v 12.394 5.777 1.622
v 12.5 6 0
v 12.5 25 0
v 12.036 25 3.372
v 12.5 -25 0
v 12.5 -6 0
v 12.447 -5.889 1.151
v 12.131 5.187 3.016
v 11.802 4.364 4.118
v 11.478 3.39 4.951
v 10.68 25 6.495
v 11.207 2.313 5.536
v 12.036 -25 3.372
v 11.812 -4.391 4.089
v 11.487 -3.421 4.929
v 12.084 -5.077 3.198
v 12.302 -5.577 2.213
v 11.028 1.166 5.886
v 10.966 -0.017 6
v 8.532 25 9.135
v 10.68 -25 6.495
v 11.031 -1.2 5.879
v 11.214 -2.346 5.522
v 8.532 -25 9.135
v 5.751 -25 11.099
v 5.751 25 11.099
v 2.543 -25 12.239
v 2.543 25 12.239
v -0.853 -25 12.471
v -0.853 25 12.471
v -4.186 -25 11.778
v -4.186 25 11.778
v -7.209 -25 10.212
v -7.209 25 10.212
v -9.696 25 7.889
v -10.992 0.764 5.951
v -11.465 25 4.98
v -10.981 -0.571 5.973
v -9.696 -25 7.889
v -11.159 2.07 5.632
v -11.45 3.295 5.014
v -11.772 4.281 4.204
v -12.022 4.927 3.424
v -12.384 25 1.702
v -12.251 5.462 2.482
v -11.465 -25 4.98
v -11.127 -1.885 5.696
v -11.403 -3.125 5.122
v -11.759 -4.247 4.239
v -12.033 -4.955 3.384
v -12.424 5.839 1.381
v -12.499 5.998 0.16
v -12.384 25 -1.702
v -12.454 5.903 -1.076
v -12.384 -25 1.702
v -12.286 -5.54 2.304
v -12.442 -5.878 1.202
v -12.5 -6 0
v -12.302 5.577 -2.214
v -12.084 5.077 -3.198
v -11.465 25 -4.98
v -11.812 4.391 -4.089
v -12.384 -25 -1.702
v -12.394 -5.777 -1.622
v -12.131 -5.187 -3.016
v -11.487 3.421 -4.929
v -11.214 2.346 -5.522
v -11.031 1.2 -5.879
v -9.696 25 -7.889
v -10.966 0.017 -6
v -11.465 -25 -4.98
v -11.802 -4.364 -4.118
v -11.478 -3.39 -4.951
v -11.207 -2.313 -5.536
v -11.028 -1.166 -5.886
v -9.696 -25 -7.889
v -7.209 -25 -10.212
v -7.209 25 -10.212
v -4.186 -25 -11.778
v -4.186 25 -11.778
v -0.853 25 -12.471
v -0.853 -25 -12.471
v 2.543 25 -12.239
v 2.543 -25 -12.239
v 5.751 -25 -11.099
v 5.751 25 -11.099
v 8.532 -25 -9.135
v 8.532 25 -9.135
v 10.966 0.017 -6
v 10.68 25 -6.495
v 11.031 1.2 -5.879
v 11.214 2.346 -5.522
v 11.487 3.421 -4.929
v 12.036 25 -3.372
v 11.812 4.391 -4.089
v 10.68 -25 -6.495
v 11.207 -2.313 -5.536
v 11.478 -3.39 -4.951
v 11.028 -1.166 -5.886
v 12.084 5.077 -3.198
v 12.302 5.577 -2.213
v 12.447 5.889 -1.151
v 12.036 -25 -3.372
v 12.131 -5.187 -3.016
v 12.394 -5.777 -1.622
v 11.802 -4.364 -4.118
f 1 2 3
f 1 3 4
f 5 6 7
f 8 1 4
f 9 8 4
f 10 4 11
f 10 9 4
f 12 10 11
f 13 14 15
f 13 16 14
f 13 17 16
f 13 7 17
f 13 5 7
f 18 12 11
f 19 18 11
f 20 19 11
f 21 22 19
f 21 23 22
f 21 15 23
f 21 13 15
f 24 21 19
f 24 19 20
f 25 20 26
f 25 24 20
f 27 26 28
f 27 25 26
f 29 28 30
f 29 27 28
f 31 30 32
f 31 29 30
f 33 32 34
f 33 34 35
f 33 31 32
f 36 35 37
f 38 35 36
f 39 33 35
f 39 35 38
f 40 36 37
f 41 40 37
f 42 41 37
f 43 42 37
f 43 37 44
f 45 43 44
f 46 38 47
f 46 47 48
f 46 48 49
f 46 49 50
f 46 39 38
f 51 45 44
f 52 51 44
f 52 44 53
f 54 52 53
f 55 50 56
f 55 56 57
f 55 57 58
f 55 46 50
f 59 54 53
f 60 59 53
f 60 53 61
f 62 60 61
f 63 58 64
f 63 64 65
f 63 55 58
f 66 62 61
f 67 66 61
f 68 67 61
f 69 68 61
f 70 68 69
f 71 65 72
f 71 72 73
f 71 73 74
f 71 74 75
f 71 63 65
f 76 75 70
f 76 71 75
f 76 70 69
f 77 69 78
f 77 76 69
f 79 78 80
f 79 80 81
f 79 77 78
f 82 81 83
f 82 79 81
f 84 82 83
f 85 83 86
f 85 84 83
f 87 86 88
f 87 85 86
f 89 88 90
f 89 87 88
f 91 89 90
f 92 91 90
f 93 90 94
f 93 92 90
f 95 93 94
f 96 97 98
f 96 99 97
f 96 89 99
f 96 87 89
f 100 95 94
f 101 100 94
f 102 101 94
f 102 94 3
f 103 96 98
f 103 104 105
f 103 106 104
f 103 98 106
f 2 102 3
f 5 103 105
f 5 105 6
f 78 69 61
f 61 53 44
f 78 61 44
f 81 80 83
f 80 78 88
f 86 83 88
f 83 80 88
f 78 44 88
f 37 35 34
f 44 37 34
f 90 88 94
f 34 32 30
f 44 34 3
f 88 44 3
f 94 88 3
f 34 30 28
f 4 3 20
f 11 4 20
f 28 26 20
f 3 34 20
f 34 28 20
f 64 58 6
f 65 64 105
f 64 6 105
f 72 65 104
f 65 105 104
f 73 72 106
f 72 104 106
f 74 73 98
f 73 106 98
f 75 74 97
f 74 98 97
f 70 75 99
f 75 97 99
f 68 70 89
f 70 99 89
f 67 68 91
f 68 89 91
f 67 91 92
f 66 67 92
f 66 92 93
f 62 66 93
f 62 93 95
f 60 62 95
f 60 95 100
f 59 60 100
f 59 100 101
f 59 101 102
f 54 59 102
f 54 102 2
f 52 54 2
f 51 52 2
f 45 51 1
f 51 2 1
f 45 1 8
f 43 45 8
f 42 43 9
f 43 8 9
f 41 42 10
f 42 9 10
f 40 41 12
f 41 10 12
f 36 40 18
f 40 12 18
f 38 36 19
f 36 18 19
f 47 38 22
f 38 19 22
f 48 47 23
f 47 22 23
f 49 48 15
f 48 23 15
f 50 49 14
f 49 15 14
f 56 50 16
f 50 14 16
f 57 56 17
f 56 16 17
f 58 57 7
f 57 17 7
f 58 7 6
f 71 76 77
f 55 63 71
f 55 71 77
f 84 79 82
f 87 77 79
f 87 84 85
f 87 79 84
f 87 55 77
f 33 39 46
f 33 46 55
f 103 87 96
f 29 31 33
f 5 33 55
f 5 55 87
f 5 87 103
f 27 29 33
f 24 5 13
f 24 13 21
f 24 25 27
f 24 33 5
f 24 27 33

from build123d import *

# Parameters (mm, degrees)
F0_R     = 12.5
F2_DEPTH = 25
F3_D     = 12
F4_D     = 12


with BuildPart() as f2:
    # F0 (on Front) → F2 (new body, symmetric)
    with BuildSketch(Plane.XZ):
        Circle(F0_R)
    extrude(amount=F2_DEPTH, both=True)

    # F3 (through all)
    with Locations(Plane(origin=(0, 0, 0), x_dir=(0, 1, 0), z_dir=(-1, 0, 0))):
        with Locations((0, 0)):
            Hole(F3_D / 2)

    # F4 (through all)
    with Locations(Plane.YZ):
        with Locations((0, 0)):
            Hole(F4_D / 2)


solid = f2.part
